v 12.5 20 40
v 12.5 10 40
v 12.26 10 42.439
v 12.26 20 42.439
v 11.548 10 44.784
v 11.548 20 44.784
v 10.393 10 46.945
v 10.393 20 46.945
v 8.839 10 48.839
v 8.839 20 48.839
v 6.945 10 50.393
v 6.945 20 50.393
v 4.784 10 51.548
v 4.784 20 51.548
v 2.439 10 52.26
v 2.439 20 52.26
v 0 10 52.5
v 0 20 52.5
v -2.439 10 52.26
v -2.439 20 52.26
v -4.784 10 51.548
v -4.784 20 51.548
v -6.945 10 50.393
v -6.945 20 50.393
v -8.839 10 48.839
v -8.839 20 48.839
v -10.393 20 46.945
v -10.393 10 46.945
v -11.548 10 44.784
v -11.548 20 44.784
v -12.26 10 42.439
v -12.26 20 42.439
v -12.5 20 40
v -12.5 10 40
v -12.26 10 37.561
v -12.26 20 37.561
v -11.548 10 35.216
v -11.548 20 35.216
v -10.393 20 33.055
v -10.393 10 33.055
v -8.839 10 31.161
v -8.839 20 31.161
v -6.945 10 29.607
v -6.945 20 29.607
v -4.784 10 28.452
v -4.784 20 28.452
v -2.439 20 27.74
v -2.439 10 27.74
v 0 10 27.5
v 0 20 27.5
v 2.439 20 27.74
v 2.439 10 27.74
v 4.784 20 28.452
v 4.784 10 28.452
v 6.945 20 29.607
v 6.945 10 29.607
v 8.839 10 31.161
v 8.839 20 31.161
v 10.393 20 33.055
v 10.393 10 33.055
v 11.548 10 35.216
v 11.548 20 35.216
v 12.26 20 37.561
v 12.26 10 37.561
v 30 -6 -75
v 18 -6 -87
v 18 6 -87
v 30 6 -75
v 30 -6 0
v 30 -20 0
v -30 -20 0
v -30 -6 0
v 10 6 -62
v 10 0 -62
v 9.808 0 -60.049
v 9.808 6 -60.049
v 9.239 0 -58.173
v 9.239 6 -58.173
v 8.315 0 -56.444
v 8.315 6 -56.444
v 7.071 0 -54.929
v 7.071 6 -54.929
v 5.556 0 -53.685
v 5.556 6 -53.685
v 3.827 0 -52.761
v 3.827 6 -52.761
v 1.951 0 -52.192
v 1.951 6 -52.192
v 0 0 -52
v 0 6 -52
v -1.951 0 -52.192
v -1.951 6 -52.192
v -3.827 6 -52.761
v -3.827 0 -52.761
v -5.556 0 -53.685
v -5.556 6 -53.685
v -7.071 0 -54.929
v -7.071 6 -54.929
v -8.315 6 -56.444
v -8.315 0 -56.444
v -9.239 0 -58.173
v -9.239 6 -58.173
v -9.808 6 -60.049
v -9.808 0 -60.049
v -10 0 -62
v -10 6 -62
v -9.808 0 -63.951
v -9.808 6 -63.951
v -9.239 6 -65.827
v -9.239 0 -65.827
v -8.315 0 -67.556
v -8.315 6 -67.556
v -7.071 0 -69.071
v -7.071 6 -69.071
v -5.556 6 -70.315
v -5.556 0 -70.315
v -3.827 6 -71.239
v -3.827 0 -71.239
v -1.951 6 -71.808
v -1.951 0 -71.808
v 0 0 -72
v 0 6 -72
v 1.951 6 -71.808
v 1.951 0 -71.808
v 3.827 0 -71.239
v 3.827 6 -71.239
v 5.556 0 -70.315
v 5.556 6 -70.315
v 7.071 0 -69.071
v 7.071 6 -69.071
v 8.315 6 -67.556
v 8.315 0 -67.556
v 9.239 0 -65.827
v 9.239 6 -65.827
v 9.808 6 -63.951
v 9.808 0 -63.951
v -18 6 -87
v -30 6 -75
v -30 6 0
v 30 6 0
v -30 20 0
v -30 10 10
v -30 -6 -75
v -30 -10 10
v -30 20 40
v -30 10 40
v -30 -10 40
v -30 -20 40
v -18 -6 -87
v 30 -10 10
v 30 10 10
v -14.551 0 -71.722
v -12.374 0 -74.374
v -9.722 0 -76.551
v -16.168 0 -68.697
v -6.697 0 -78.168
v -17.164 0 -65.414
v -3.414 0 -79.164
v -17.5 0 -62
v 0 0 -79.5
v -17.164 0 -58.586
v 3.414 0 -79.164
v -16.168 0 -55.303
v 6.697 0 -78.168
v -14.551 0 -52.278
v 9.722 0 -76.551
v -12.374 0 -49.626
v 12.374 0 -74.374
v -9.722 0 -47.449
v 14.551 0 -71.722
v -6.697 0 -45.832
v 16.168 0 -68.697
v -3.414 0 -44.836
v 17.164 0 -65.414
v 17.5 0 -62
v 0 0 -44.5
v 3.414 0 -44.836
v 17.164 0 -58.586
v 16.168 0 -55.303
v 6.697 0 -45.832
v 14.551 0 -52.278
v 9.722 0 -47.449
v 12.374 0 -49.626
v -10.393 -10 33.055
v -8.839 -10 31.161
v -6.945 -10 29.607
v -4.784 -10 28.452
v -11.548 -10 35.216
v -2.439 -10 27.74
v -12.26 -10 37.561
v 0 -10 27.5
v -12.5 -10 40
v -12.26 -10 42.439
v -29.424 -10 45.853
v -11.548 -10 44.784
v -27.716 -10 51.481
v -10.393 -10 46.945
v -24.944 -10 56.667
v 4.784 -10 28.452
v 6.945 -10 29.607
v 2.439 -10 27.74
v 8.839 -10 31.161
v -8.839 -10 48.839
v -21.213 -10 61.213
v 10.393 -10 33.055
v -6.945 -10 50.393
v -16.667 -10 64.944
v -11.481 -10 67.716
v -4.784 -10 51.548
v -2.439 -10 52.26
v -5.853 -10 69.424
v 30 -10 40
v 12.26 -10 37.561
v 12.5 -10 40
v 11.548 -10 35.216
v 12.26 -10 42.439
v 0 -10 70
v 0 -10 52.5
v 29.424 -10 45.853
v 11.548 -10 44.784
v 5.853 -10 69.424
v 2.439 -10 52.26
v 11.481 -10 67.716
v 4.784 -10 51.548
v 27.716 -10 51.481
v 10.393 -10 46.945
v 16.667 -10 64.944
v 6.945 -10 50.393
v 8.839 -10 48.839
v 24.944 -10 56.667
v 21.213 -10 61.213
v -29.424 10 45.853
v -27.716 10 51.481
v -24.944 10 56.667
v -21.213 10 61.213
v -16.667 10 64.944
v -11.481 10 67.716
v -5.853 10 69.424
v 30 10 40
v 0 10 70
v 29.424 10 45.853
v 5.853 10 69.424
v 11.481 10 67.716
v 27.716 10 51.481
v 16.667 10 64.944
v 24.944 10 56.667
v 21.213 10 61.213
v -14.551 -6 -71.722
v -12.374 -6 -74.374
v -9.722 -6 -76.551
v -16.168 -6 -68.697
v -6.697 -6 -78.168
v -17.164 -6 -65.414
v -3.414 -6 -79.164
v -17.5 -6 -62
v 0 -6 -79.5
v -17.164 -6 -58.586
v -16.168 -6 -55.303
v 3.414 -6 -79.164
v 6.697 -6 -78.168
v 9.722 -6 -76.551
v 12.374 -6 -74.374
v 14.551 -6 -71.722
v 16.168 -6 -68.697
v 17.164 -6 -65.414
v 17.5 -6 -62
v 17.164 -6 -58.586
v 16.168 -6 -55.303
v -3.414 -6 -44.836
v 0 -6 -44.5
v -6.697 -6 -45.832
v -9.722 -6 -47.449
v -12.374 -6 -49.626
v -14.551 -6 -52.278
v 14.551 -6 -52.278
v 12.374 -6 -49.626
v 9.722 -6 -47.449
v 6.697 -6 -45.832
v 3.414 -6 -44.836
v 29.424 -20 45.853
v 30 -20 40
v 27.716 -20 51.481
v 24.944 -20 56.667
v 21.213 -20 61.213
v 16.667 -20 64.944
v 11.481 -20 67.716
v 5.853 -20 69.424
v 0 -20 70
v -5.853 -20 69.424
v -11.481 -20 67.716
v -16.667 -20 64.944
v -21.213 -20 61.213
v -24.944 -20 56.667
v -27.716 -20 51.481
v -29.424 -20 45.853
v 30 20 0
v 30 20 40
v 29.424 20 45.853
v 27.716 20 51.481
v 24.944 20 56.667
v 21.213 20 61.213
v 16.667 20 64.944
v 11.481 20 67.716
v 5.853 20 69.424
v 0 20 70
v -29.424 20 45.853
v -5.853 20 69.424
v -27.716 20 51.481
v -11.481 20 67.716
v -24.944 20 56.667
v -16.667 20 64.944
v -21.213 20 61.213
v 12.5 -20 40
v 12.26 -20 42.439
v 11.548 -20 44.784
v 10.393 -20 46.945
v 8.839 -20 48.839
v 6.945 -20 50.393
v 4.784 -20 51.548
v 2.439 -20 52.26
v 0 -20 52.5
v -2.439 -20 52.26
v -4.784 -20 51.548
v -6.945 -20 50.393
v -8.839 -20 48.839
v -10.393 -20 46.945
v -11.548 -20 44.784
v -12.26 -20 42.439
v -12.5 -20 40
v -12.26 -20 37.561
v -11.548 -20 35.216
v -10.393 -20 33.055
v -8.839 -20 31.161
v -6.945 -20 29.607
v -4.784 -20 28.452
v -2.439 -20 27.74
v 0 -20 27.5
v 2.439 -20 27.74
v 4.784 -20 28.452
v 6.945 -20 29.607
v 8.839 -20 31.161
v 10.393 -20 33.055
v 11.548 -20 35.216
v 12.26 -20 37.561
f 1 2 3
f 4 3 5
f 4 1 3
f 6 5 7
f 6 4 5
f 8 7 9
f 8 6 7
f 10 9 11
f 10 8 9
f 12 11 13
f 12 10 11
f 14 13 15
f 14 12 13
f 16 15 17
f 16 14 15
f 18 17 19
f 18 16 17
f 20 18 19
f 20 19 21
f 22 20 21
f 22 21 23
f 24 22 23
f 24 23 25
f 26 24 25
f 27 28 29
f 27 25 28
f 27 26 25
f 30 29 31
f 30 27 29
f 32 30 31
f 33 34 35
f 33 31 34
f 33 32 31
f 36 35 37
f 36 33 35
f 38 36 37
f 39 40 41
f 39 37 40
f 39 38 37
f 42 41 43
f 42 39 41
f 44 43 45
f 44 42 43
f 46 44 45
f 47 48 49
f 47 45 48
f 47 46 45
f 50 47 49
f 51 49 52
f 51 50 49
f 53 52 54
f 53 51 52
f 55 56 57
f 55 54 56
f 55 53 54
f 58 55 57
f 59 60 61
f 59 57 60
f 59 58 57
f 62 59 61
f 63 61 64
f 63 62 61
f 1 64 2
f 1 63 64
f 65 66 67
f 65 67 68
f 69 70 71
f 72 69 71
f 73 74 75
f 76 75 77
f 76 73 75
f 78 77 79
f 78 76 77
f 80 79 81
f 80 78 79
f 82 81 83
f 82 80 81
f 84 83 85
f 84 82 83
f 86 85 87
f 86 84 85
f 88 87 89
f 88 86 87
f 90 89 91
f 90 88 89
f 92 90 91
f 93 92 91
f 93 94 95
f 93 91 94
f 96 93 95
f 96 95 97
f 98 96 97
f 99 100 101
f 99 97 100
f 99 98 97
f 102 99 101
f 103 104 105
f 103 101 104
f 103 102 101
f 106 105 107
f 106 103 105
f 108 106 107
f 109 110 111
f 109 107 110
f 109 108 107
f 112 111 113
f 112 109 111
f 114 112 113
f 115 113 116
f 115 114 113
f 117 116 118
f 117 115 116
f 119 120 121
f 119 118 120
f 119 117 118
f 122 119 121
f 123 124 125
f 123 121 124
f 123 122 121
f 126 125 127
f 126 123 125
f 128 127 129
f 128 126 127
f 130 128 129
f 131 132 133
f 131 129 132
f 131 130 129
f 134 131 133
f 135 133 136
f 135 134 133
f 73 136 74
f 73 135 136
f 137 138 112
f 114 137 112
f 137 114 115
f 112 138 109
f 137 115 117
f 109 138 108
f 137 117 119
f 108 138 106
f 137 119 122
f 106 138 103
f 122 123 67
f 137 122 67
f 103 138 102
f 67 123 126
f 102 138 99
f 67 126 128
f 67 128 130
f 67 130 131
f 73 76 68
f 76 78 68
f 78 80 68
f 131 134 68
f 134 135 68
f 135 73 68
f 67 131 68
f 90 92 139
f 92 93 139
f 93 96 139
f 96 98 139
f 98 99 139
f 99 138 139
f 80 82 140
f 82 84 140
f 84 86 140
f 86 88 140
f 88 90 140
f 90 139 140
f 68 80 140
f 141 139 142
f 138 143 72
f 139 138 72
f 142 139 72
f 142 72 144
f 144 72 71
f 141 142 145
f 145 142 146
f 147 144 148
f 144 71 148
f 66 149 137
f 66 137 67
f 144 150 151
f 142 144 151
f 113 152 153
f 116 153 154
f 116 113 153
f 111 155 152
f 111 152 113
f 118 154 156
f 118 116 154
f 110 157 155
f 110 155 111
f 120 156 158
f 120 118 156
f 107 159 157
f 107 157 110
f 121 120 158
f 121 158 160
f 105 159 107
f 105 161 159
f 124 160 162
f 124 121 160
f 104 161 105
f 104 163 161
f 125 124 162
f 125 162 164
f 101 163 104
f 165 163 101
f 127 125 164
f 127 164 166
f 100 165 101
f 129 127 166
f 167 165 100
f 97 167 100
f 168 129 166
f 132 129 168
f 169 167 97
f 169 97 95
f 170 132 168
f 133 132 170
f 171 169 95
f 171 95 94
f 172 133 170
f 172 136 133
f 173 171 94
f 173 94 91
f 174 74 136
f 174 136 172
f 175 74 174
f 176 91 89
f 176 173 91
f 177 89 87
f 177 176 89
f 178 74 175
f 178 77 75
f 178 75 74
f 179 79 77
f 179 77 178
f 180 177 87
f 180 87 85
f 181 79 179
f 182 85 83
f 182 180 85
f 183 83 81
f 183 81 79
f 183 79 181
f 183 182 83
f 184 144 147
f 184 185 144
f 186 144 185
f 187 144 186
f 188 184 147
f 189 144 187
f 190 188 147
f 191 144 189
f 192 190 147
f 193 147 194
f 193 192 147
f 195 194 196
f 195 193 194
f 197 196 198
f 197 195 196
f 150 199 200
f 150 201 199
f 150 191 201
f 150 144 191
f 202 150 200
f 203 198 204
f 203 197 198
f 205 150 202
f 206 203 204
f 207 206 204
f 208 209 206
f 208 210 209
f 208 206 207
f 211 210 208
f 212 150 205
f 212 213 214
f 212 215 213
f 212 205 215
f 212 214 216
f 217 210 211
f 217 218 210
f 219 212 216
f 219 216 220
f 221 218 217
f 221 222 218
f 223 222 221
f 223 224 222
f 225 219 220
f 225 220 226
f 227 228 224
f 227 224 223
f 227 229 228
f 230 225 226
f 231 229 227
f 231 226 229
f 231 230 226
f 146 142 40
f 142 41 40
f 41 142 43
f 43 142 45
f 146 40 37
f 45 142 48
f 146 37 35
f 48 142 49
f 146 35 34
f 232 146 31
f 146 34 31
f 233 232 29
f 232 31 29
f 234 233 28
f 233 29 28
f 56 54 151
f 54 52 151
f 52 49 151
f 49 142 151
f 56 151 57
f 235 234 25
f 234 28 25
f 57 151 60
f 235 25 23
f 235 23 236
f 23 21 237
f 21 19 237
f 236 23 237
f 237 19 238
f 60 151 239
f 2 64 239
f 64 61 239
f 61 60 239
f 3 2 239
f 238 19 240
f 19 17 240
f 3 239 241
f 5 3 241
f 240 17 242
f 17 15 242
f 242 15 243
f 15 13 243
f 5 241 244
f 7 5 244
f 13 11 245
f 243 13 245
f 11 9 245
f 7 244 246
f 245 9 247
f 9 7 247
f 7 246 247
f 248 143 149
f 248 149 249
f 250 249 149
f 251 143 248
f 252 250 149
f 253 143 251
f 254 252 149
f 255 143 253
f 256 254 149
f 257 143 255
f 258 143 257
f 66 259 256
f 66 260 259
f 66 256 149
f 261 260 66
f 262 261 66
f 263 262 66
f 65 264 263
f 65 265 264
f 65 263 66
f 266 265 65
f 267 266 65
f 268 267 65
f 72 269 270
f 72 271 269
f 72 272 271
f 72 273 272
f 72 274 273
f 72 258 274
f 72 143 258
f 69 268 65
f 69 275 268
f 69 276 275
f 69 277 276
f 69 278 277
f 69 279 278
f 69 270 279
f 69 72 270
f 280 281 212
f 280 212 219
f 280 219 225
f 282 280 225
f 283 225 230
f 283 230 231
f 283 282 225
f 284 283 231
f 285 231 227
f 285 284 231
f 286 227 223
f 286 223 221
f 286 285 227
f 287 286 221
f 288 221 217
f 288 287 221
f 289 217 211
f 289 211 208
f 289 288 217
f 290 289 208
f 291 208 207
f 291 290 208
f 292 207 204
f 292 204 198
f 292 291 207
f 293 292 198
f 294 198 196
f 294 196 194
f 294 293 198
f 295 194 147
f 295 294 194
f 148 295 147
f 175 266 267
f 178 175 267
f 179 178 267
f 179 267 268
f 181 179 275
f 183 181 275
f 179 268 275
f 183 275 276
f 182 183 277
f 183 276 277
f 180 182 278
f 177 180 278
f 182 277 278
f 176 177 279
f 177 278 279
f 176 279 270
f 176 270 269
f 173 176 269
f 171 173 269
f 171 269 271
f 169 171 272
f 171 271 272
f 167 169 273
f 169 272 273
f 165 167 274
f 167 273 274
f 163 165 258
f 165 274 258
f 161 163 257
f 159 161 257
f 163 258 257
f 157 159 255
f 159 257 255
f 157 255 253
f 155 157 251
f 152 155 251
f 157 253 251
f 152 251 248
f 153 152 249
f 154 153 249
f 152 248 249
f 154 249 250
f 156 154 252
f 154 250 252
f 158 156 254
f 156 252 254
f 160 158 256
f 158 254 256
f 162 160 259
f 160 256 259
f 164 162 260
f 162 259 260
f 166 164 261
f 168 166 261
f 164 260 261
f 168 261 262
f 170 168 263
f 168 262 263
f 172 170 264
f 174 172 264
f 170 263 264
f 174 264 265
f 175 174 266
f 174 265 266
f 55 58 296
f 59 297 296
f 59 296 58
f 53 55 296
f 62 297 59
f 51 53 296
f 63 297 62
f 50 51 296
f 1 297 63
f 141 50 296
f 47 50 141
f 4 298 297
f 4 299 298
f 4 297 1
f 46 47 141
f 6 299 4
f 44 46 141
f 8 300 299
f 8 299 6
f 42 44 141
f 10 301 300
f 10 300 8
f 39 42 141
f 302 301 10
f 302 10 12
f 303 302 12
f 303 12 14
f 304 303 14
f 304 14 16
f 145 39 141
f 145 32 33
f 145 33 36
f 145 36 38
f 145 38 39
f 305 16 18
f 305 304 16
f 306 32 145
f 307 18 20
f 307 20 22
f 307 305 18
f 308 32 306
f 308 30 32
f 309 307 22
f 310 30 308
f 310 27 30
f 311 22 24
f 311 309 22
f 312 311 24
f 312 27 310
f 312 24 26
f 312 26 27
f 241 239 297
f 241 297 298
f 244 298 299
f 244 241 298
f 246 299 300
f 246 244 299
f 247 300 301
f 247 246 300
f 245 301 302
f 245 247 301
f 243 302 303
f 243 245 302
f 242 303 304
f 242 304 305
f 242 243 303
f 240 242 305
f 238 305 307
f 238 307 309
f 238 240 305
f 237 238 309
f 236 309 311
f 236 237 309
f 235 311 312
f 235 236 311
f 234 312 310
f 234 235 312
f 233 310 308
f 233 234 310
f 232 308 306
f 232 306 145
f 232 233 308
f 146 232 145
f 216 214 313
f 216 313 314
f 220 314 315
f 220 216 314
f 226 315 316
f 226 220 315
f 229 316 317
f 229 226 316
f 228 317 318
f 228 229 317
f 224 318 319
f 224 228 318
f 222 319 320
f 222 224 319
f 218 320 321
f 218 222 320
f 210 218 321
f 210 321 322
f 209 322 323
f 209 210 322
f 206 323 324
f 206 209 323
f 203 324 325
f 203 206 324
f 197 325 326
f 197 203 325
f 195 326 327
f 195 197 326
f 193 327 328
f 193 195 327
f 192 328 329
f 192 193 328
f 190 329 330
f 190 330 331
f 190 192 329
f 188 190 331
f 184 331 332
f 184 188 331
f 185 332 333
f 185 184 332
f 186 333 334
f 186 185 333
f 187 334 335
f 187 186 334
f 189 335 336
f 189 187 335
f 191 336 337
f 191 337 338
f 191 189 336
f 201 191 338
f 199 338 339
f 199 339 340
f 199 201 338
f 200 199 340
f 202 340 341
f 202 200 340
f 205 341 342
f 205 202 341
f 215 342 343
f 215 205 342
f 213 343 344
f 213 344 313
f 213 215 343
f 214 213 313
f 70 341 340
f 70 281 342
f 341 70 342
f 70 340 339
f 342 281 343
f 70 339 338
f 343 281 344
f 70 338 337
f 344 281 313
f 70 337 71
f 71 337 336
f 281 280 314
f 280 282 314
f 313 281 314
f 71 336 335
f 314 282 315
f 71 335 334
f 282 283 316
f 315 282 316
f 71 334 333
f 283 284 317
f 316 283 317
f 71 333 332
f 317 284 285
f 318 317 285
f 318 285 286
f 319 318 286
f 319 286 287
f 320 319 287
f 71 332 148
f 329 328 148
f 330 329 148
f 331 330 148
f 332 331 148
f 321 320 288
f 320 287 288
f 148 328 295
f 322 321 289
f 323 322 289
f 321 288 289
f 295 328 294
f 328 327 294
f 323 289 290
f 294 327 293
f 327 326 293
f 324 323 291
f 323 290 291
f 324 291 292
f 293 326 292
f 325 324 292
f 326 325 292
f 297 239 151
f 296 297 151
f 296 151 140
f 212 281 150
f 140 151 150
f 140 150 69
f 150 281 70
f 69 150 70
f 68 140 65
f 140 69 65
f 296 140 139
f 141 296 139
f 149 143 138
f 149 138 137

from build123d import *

# Parameters (mm, degrees)
SKETCH001_W  = 20
SKETCH001_H  = 80.939507
PAD001_DEPTH = 40
SKETCH_R     = 12.5
PAD_DEPTH    = 20
SKETCH002_R  = 10
PAD002_DEPTH = 6
SKETCH003_R  = 17.5
POCKET_DEPTH = 6


with BuildPart() as pad001:
    # Sketch001 → Pad001 (new body, symmetric)
    with BuildSketch(Plane.YZ):
        with Locations((0, 50.469753)):
            Rectangle(SKETCH001_W, SKETCH001_H)
    extrude(amount=PAD001_DEPTH, both=True)


with BuildPart() as cut:
    # Sketch → Pad (new body, symmetric)
    with BuildSketch(Plane.XZ):
        with BuildLine():
            Line((30, 40), (30, 0))
            Line((30, 0), (-30, 0))
            Line((-30, 0), (-30, 40))
            ThreePointArc((30, 40), (0, 70), (-30, 40))
        make_face()
        with Locations((0, 40)):
            Circle(SKETCH_R, mode=Mode.SUBTRACT)
    extrude(amount=PAD_DEPTH, both=True)

    # Cut: cut Pad001
    add(pad001.part, mode=Mode.SUBTRACT)


with BuildPart() as fusion:
    # Sketch002 → Pad002 (new body, symmetric)
    with BuildSketch(Plane.XZ):
        Polygon((-30, 0), (-30, -75), (-18, -87), (18, -87), (30, -75), (30, 0), align=None)
        with Locations((0, -62)):
            Circle(SKETCH002_R, mode=Mode.SUBTRACT)
    extrude(amount=PAD002_DEPTH, both=True)

    # Sketch003 → Pocket (cut)
    with BuildSketch(Plane.XZ.offset(6)):
        with Locations((0, -62)):
            Circle(SKETCH003_R)
    extrude(amount=-POCKET_DEPTH, mode=Mode.SUBTRACT)

    # Fusion: union Cut
    add(cut.part)


solid = fusion.part
